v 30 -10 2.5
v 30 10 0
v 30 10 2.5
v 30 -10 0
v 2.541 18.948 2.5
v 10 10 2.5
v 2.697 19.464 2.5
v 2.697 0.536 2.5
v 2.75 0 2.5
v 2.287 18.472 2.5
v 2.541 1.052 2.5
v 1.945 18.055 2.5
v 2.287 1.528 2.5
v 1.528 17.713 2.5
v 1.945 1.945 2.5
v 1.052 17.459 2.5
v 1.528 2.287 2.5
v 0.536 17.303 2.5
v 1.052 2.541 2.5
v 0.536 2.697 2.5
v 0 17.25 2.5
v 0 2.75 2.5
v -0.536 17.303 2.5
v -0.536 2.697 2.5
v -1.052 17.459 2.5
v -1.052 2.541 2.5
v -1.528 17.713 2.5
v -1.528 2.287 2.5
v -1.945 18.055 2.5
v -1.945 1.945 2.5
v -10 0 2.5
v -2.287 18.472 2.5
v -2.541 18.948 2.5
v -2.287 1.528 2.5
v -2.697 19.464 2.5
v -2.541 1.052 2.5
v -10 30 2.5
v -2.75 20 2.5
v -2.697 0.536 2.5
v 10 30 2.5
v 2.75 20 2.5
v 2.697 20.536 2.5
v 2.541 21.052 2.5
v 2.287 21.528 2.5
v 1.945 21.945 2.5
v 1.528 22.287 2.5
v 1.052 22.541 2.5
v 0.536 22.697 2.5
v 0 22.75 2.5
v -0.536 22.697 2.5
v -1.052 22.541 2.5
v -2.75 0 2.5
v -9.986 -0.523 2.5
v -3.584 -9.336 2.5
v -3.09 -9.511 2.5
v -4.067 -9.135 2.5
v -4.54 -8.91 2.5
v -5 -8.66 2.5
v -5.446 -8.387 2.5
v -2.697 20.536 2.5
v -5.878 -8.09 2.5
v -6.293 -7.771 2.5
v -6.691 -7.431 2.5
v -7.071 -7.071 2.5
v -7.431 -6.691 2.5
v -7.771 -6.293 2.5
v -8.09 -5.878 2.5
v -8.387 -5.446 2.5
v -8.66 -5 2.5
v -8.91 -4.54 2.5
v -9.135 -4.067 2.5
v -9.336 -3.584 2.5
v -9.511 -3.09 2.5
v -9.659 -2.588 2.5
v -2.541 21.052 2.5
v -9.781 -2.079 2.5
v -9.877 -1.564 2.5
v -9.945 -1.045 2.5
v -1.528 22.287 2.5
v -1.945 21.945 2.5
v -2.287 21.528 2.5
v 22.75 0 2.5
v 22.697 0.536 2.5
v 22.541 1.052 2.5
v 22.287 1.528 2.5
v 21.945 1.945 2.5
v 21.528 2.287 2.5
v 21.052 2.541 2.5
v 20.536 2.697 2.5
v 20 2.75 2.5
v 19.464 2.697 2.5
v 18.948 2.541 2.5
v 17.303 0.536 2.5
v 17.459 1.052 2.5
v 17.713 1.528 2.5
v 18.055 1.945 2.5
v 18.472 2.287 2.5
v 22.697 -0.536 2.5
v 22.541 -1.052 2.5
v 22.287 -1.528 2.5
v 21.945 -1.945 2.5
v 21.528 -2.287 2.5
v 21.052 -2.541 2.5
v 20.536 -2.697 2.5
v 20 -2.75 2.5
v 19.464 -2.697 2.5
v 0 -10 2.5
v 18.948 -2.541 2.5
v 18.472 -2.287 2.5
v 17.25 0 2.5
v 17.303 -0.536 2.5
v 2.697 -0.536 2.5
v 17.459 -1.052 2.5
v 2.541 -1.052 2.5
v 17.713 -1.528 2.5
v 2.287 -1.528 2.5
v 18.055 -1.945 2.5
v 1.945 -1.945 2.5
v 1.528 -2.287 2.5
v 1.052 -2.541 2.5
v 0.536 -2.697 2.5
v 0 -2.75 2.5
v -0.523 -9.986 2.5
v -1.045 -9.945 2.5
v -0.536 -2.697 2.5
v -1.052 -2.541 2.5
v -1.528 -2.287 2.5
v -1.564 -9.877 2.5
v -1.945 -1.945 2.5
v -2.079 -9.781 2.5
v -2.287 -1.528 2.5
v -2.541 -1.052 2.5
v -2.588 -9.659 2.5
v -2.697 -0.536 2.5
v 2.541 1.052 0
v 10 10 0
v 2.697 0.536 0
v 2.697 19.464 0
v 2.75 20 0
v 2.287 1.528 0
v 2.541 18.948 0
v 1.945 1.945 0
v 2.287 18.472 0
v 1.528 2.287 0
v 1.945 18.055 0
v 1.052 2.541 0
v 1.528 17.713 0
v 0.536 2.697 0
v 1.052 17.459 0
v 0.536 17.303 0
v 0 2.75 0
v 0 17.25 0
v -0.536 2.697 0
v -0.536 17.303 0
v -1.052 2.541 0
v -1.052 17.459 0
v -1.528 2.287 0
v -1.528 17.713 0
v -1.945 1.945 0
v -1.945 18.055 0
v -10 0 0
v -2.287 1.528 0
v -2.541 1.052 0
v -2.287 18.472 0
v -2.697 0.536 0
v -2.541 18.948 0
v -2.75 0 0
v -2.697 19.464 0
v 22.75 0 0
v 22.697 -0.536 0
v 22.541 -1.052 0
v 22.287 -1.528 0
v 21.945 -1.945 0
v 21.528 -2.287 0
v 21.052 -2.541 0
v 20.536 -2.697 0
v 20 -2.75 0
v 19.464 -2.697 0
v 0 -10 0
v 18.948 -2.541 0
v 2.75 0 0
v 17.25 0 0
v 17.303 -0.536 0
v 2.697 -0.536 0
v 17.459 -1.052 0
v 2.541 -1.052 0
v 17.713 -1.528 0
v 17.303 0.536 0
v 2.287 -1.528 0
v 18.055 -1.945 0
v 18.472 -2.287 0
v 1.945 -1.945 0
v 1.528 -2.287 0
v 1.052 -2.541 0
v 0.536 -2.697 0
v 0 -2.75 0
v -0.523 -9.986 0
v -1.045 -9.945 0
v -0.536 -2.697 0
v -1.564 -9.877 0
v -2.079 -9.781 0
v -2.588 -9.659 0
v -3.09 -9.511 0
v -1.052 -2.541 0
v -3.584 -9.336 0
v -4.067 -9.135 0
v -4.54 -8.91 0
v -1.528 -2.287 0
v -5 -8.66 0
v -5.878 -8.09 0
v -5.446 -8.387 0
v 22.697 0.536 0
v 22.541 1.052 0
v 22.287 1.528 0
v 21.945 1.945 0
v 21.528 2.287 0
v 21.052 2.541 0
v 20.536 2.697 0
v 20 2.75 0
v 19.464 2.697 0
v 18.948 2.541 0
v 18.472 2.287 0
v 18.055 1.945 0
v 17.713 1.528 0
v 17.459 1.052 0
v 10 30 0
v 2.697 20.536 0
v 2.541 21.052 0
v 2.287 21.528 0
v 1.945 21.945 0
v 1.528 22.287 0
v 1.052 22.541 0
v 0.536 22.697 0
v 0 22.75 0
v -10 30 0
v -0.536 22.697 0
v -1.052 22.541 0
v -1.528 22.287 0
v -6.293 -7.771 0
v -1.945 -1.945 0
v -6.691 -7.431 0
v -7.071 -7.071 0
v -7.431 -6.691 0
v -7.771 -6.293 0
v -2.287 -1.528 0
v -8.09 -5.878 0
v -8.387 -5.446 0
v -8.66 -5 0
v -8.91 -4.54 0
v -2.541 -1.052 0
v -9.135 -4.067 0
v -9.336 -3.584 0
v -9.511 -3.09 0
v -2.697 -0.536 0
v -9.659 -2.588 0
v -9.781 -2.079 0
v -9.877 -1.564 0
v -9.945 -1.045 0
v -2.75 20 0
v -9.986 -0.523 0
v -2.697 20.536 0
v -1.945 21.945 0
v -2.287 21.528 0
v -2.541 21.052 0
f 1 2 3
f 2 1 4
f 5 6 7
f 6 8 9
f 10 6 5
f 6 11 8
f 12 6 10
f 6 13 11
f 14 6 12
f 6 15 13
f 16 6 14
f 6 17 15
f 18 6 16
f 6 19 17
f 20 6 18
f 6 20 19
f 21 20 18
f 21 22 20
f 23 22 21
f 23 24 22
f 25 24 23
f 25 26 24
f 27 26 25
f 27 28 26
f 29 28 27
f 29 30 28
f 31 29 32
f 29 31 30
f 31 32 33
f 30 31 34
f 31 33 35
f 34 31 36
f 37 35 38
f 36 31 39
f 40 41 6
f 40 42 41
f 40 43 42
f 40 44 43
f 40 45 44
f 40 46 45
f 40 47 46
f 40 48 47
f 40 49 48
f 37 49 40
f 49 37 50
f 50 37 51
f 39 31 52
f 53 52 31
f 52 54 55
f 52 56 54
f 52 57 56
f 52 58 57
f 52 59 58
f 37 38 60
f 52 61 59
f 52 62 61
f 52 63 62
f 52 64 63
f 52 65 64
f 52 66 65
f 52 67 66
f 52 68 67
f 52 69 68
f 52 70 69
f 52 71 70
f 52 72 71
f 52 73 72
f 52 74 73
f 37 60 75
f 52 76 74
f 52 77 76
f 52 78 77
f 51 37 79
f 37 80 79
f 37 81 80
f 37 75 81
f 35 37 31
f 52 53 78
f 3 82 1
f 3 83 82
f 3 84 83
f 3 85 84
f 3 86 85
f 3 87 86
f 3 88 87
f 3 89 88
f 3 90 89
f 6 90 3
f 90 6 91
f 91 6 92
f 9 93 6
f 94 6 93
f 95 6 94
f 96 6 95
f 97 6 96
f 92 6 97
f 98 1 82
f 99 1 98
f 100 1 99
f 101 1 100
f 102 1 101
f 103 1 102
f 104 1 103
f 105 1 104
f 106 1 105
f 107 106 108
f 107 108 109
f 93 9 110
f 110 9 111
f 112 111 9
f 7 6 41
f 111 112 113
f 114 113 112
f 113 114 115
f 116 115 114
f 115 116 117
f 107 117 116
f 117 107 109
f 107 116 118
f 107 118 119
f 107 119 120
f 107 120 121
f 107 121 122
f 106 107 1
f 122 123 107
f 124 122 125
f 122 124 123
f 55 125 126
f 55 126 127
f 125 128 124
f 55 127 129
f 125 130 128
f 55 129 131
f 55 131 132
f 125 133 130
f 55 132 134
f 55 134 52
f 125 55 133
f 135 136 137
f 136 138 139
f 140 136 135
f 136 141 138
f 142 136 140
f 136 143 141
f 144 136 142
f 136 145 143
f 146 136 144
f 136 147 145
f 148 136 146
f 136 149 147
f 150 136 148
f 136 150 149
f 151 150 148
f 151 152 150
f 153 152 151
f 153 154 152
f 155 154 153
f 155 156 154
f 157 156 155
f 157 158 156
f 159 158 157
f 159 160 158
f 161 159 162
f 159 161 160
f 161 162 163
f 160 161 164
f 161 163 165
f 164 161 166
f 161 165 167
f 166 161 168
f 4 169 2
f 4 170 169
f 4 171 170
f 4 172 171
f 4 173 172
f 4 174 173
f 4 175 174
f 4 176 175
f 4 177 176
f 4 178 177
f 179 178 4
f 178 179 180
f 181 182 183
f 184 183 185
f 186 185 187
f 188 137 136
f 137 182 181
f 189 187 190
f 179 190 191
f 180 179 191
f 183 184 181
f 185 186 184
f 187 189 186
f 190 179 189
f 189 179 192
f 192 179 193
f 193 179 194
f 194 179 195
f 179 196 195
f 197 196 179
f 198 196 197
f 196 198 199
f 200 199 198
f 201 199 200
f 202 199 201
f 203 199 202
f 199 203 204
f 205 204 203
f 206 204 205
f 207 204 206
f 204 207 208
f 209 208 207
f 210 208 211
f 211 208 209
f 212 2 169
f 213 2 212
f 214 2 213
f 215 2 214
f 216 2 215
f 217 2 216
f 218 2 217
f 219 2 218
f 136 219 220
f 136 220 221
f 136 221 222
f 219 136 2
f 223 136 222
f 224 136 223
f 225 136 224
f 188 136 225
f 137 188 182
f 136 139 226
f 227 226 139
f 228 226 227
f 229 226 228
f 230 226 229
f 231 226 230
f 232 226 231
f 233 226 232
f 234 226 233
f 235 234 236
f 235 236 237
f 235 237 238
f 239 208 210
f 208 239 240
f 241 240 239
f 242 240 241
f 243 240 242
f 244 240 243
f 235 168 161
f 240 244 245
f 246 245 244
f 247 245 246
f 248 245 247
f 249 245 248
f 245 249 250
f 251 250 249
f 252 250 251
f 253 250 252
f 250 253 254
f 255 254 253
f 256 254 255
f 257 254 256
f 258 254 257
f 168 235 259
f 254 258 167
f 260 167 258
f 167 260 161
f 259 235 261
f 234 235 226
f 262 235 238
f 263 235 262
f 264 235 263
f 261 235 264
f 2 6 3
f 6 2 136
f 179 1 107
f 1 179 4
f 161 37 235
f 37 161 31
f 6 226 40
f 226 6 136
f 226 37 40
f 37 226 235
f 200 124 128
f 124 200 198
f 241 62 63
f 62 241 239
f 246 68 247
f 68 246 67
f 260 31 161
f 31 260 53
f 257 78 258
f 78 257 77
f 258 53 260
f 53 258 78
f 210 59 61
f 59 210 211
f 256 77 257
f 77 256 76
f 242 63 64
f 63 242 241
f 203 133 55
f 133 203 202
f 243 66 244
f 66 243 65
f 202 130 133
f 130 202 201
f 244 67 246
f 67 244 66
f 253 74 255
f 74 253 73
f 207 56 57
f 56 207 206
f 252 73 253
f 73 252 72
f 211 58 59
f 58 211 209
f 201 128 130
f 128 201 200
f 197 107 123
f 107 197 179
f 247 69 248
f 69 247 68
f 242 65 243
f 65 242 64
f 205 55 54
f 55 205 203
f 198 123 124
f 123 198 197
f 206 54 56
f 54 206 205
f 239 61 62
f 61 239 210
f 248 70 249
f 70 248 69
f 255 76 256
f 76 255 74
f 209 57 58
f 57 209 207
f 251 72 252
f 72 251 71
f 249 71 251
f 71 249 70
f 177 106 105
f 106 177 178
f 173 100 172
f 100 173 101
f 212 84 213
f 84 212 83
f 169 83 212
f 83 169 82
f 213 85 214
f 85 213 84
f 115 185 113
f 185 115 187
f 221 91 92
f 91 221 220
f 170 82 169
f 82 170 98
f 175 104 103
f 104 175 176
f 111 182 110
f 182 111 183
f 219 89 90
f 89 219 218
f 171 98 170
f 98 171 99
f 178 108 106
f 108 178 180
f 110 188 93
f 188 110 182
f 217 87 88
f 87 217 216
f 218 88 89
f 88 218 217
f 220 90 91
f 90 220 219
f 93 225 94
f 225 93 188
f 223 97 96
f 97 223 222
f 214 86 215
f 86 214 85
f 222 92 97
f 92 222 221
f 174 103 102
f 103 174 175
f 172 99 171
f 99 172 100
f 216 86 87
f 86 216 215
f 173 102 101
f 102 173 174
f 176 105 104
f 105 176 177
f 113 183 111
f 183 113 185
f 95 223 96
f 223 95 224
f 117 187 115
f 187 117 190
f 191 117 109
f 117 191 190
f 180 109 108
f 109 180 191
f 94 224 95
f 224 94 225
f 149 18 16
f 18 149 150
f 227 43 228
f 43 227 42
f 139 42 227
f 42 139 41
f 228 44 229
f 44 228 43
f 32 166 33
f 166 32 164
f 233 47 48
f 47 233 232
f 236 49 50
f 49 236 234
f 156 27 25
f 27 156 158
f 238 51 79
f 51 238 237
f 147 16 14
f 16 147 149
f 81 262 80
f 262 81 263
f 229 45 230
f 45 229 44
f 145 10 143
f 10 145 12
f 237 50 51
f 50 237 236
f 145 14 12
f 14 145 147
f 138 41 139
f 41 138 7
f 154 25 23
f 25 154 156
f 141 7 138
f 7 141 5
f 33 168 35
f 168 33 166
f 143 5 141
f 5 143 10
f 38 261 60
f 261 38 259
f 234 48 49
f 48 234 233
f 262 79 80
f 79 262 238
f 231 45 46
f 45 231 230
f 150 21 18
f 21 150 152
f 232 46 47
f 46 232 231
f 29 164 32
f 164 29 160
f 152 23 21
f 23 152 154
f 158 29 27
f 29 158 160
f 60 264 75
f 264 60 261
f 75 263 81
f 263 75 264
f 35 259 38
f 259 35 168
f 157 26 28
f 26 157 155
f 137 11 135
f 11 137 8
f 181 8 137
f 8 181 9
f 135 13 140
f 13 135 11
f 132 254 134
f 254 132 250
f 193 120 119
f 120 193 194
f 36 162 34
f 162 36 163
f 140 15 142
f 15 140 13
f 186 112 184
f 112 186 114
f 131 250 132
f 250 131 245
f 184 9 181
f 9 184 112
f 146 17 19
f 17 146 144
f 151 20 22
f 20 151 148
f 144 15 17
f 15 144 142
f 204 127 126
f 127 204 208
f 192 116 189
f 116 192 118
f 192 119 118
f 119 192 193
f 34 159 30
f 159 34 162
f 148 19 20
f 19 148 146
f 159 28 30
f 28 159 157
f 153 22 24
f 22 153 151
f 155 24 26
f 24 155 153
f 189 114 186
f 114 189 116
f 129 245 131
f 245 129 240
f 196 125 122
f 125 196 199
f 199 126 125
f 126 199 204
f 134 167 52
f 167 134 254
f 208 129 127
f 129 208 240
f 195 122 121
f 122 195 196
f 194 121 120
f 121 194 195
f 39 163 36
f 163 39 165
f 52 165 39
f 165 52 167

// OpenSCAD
1010GantryBracket(2.5); 
//1010MotorMount(2.5);

module 1010GantryBracket(thickness=2.5){
    translate([0,0,thickness/2])
    difference(){
    union(){
        translate([30/2,0,0])
        cube([30,20,thickness], center=true);


        rotate([0,0,90])
        translate([30/2,0,0])
        cube([30,20,thickness], center=true);

        cylinder(d=20, h=thickness, $fn=4*30, center=true);
    }

    translate([20,0,0])
    cylinder(d=5.5, h=thickness+.5, $fn=4*8, center = true);
    translate([0,20,0])
    cylinder(d=5.5, h=thickness+.5, $fn=4*8, center = true);
    cylinder(d=5.5, h=thickness+.5, $fn=4*8, center = true);
    }
}

module 1010MotorMount(thickness=1){
    translate([-(42+20+5.4)/2,0,0])
    linear_extrude(thickness){
        union(){
            difference(){
                square([42,42],center=true);
                
                for(i=[0:1]){
                    rotate([0,0,90+45+90*i])
                    translate([10+53/2,0,0])
                    square([20,20],center=true);
                }
                for(i=[0:3]){
                    
                    rotate([0,0,45+90*i])
                    translate([(41+47)/4,0,0])
                    circle(d=4, center=true, $fn=4*10);
                }
                
                circle(d=25, center=true, $fn=4*25);
            }
            
        }
        
        
        translate([42/2+5.4/4,0,0])
        square([5.4/2,42], center=true);
        
            translate([(42+20+5.4)/2,0,0])
        difference(){
            square([20,42],center=true);
            for(i=[-1,1]){
                translate([0,i*42/4,0])
                circle(d=5.5, $fn=4*25);
                
                translate([(42+20+20+2.2)/2,0,0])
                for(i=[0:1]){
                    rotate([0,0,90+45+90*i])
                    translate([10+53/2,0,0])
                    square([20,20],center=true);
                }
            }
        }
    }
}
